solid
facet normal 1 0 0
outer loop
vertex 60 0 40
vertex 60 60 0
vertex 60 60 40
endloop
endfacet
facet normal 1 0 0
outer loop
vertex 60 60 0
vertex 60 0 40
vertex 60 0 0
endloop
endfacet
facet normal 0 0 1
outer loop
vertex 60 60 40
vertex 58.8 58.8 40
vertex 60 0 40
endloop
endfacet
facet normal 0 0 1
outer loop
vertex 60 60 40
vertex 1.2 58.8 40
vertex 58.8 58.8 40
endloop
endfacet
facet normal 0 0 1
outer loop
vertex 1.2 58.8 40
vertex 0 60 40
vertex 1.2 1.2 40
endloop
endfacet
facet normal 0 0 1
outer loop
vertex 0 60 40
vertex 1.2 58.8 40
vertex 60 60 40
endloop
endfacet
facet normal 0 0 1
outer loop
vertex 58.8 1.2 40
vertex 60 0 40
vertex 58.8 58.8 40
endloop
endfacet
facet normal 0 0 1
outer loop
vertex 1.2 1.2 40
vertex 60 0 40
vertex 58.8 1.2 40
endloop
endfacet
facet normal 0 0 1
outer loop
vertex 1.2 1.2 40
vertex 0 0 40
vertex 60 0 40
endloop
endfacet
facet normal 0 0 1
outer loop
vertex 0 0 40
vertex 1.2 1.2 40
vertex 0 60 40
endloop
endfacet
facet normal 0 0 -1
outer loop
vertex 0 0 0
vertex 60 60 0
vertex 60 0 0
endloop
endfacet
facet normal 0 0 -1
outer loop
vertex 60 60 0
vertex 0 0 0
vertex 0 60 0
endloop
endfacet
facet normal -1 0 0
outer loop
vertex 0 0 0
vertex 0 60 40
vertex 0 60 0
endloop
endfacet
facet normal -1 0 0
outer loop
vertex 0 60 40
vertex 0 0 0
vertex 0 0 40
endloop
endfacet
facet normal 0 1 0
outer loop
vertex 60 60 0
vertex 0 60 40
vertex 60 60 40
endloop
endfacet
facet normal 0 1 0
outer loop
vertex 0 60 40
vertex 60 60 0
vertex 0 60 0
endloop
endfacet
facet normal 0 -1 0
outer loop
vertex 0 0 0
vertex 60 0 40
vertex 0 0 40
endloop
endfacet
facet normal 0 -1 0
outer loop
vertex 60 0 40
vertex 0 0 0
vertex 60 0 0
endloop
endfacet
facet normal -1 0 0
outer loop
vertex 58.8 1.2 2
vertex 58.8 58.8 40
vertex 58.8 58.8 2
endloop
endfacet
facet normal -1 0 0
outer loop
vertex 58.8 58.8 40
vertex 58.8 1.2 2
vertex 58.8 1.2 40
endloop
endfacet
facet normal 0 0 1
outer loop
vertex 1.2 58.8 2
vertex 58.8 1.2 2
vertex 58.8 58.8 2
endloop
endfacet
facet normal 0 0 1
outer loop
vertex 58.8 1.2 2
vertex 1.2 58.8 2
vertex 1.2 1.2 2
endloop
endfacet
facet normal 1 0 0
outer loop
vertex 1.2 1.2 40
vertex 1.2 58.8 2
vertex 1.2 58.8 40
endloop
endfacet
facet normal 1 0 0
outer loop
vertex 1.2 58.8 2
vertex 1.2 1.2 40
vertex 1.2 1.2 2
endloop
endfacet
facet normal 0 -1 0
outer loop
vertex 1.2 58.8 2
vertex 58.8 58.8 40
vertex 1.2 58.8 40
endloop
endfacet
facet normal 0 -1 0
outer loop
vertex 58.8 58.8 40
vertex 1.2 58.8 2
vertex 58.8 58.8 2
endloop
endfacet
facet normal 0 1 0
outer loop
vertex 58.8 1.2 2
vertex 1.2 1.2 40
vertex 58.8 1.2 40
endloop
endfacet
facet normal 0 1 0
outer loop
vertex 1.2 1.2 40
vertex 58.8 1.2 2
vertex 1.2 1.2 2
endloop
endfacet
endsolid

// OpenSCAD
$fn = 32;

// ----------------------------------------------------------------------
// Open box: 1.2 mm walls
// ----------------------------------------------------------------------

// --- parameters (mm) ---
box_l = 60;               // outer length, X
box_w = 60;               // outer width, Y
box_h = 40;               // outer height, Z
wall = 1.2;               // wall thickness
floor = 2;                // floor thickness
fit_tol = 0.05;           // tolerance for press fits, mm
free_tol = 0.2;           // tolerance for clearance fits, mm

difference() {
  cube([box_l, box_w, box_h]);
  translate([wall, wall, floor])
    cube([box_l - 2 * wall, box_w - 2 * wall, box_h]);
}
